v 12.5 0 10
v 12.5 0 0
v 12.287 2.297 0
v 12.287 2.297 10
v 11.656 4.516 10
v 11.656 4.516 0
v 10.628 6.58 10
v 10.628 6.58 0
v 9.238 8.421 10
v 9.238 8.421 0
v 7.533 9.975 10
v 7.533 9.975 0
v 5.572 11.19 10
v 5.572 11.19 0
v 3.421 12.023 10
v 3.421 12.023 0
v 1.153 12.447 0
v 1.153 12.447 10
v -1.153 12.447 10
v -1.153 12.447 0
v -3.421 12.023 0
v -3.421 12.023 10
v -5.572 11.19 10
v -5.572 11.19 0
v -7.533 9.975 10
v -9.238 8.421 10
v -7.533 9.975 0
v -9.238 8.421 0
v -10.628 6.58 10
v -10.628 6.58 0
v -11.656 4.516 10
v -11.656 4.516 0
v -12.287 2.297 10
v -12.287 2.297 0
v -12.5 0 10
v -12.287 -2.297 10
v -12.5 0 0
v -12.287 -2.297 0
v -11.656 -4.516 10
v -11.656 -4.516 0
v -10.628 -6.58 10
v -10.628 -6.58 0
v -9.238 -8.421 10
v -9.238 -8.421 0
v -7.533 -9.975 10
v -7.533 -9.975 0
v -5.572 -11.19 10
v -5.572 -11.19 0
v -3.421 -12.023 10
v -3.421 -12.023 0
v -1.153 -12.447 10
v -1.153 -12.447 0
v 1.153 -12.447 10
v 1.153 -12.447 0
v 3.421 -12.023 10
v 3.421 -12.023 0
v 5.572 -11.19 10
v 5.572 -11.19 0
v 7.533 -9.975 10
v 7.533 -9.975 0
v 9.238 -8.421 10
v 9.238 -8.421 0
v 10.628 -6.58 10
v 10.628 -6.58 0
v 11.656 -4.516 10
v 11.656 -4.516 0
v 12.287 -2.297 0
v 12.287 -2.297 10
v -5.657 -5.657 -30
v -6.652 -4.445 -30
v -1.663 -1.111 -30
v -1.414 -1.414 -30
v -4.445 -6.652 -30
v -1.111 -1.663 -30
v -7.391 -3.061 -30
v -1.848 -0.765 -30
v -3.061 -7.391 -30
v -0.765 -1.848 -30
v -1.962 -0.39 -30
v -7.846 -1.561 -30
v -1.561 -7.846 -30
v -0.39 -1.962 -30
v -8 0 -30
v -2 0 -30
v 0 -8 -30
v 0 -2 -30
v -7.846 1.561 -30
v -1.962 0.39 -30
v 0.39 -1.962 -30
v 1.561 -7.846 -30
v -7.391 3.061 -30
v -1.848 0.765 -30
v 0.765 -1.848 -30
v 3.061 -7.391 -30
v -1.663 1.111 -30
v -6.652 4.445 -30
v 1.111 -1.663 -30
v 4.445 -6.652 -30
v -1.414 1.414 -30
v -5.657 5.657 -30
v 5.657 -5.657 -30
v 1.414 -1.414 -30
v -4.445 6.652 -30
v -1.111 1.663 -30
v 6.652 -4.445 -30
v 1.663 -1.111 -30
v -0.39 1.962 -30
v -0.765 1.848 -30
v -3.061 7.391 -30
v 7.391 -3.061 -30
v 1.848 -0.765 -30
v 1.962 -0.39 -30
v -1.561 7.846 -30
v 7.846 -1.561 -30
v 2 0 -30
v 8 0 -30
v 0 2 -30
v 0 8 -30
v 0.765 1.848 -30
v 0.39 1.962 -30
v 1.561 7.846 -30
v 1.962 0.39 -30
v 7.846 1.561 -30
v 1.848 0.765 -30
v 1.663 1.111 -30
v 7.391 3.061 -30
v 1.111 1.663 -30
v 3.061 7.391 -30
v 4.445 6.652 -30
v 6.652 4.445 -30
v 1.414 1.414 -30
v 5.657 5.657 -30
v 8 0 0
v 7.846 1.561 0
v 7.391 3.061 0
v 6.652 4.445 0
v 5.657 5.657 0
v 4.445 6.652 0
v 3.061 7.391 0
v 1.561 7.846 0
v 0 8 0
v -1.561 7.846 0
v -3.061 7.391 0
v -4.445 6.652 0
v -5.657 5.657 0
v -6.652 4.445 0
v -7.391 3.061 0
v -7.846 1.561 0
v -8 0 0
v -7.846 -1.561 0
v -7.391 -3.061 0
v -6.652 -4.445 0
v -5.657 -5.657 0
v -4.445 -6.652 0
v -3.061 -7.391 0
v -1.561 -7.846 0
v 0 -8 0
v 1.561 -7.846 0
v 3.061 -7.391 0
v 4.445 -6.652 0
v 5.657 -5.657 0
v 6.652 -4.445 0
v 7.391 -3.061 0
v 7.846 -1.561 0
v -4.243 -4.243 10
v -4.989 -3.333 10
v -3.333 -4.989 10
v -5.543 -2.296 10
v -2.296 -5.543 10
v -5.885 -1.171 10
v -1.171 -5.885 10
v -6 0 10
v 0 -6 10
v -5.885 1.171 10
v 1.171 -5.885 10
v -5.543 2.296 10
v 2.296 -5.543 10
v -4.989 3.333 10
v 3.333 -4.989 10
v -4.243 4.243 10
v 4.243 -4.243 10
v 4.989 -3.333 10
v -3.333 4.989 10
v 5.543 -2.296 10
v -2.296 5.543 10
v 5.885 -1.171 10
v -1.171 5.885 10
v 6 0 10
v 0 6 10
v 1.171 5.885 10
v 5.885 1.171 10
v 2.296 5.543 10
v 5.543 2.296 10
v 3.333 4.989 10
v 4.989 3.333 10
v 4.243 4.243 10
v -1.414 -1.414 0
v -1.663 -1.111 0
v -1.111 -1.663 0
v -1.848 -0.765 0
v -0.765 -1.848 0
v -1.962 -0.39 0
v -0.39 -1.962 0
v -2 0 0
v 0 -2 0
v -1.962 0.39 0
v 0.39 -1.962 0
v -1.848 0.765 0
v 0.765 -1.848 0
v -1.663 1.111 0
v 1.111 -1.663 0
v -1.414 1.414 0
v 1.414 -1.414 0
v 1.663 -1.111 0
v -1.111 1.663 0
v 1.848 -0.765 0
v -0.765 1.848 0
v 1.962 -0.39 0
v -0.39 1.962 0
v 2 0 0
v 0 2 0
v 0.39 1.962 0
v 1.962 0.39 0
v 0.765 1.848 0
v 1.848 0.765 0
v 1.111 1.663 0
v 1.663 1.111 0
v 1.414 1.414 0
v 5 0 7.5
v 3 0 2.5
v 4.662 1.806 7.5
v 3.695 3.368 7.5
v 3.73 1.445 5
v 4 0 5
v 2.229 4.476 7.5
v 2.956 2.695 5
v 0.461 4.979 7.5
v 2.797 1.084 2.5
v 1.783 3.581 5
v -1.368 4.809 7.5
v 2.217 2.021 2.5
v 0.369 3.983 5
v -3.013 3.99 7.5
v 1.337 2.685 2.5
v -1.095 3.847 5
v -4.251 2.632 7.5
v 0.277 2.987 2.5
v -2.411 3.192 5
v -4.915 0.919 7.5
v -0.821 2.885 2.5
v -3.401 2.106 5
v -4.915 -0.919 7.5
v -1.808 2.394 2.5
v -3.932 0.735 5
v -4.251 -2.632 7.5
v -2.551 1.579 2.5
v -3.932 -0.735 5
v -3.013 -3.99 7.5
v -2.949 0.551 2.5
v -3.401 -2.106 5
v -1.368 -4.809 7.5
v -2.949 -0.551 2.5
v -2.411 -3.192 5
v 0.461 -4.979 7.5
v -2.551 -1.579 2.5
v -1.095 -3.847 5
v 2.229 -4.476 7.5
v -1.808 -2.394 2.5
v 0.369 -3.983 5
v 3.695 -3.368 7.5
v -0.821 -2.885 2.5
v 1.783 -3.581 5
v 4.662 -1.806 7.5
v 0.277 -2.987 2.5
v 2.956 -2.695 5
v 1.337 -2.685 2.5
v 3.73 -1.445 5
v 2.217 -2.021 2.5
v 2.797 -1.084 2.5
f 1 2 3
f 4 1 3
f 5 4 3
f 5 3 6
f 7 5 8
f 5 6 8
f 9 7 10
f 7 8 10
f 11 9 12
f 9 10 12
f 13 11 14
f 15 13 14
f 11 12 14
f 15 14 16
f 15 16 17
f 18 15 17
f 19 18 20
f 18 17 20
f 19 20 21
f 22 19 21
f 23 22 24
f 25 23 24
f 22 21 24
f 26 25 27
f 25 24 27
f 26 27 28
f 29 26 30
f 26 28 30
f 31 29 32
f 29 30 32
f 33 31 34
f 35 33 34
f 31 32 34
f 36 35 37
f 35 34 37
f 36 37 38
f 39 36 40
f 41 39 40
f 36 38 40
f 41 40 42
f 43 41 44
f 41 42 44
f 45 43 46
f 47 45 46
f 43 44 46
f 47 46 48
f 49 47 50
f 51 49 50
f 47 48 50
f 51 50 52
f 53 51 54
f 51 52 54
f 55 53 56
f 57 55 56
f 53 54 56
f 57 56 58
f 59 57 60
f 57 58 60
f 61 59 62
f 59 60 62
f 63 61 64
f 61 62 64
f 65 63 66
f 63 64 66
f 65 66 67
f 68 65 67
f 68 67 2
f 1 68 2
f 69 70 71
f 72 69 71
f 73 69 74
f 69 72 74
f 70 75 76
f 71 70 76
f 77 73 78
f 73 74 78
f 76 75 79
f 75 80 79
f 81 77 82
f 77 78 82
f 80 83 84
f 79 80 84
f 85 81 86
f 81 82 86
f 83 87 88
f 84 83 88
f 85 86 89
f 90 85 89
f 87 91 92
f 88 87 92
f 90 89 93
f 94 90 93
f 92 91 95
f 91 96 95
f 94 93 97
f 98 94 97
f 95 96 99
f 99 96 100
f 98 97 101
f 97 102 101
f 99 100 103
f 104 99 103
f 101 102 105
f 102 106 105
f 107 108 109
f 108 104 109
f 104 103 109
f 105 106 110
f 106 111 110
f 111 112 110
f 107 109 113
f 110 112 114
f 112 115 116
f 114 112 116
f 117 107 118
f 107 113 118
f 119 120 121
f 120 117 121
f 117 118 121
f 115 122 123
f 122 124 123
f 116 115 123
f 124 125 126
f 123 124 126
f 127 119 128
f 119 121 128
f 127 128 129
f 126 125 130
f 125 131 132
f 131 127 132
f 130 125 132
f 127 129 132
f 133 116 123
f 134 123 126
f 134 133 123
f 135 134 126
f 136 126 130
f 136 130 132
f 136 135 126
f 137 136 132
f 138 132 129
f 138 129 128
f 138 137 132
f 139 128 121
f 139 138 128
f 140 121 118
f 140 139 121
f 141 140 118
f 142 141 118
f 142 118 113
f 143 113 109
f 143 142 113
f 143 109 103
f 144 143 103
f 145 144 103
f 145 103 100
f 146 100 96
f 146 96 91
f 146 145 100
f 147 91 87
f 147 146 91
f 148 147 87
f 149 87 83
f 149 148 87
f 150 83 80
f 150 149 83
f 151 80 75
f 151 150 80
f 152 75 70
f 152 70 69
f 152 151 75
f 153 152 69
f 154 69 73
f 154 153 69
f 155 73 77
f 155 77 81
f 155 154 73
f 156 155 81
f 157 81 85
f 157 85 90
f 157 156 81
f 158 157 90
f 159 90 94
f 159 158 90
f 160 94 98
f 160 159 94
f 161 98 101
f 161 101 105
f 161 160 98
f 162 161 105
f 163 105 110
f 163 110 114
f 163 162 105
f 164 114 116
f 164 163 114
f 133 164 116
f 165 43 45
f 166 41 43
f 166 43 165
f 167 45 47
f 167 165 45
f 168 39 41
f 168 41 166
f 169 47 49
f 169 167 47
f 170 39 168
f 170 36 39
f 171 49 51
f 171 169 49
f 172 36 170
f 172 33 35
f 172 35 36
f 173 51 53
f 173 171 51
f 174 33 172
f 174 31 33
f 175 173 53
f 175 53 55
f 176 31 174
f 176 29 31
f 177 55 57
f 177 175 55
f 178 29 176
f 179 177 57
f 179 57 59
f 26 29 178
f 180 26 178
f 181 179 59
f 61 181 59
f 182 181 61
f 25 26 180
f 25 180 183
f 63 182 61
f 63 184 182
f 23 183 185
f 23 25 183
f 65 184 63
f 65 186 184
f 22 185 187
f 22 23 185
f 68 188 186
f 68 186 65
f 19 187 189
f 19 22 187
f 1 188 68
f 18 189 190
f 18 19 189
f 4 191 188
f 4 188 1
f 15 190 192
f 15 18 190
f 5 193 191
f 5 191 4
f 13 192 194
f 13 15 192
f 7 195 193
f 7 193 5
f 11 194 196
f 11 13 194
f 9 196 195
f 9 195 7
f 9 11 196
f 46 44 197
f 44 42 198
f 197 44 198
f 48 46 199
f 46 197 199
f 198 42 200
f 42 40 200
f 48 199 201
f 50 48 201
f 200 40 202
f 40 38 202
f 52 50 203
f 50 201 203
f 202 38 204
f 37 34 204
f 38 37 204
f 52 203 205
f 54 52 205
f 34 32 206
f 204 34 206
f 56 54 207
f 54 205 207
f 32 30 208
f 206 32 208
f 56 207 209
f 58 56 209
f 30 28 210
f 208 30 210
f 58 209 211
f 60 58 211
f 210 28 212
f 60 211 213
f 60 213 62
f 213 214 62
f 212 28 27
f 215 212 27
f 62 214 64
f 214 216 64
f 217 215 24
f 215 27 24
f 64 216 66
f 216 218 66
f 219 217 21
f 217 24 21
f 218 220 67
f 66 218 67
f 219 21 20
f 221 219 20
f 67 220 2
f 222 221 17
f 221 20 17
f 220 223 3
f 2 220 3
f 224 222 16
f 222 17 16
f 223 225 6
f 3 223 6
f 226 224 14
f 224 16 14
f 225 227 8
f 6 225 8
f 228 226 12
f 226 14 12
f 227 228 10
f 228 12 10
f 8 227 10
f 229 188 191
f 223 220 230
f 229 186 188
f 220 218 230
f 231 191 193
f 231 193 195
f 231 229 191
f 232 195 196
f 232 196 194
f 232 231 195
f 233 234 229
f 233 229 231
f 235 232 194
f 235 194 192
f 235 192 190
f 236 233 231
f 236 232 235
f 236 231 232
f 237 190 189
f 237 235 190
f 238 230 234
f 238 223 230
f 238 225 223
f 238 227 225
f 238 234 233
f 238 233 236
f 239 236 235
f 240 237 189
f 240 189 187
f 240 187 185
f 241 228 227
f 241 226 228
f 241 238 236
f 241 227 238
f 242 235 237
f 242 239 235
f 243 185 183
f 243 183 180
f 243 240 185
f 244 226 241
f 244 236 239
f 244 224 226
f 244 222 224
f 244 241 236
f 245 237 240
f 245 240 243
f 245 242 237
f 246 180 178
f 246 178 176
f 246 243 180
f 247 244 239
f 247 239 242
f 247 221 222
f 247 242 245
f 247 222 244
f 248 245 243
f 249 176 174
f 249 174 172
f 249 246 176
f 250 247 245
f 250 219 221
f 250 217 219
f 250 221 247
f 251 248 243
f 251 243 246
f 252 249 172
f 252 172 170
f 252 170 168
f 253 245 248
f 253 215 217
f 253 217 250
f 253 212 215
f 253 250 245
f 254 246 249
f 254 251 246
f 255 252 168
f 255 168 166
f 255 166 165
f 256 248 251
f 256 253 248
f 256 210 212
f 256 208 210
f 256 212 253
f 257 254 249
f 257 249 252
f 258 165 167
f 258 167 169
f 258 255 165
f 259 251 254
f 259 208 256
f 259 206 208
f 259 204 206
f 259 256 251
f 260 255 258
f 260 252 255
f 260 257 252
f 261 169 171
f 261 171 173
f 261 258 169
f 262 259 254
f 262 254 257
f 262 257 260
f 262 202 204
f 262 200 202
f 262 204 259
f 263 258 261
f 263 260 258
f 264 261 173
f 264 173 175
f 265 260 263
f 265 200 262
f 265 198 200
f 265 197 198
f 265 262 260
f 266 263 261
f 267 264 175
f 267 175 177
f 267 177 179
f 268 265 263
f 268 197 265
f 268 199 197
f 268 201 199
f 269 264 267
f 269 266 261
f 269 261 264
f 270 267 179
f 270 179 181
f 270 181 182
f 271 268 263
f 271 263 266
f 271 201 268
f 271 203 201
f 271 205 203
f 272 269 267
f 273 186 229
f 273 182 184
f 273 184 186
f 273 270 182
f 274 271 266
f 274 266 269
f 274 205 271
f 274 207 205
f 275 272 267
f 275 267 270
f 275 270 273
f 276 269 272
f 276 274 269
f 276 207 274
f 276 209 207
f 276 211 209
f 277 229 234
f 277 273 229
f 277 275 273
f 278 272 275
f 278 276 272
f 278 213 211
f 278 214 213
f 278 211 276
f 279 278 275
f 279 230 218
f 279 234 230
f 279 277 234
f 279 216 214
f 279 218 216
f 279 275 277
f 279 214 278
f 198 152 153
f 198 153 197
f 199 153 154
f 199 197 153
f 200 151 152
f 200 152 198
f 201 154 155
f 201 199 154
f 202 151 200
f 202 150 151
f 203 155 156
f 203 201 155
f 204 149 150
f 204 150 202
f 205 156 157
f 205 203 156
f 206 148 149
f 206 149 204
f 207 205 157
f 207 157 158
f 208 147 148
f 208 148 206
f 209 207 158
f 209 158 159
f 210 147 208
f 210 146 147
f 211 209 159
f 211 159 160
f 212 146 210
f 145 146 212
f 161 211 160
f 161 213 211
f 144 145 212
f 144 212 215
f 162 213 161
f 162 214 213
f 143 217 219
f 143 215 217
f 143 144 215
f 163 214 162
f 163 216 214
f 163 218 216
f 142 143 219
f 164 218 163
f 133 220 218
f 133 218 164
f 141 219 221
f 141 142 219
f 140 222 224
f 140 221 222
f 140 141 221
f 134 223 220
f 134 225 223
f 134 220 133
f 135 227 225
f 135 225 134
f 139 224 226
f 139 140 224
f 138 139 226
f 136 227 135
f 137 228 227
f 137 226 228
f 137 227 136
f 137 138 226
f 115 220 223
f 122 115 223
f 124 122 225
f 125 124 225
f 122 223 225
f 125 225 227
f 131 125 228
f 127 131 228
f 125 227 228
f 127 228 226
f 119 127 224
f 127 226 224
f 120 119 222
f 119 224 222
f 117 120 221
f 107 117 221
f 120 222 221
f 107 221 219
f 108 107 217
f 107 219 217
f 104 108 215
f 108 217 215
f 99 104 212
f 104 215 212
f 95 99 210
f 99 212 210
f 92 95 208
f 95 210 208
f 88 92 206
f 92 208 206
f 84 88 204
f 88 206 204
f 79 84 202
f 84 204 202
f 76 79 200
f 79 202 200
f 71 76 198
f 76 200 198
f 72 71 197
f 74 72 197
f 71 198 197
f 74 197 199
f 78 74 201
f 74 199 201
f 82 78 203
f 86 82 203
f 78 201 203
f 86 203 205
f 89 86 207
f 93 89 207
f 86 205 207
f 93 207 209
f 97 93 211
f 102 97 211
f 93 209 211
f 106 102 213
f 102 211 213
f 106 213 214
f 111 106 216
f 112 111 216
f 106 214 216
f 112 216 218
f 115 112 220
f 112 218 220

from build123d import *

# Parameters (mm, degrees)
F0_R     = 8
F1_DEPTH = 30
F2_R     = 2
F3_DEPTH = 30
F4_R     = 12.5
F4_R_2   = 8
F4_R_3   = 2
F5_DEPTH = 10
F6_SIZE2 = 9.99999
F6_SIZE  = 3.99999


# Not quite as in the source:
# - a fillet or chamfer is up to 0.001 mm smaller than in the source, because OpenCascade refuses the exact size


with BuildPart() as f1:
    # F0 (on Top) → F1 (new body)
    with BuildSketch(Plane.XY):
        Circle(F0_R)
    extrude(amount=-F1_DEPTH)

    # F2 (on face) → F3 (cut)
    with BuildSketch(Plane.XY):
        Circle(F2_R)
    extrude(amount=-F3_DEPTH, mode=Mode.SUBTRACT)


with BuildPart() as f5:
    # F4 (on face) → F5 (new body)
    with BuildSketch(Plane.XY):
        Circle(F4_R)
        Circle(F4_R_2, mode=Mode.SUBTRACT)
        Circle(F4_R_2)
        Circle(F4_R_3, mode=Mode.SUBTRACT)
    extrude(amount=F5_DEPTH)

    # F6 (size 4 and 10 in the source; OpenCascade refuses exactly that, so slightly less here)
    f6_edges = [f5.edges().sort_by_distance(p)[0] for p in [
        (-2, 0, 10),
    ]]
    f6_side = f5.faces().sort_by_distance((-12.146447, 0, 10))[0]
    chamfer(f6_edges, length=F6_SIZE, length2=F6_SIZE2, reference=f6_side)


solid = Compound([f1.part, f5.part])
